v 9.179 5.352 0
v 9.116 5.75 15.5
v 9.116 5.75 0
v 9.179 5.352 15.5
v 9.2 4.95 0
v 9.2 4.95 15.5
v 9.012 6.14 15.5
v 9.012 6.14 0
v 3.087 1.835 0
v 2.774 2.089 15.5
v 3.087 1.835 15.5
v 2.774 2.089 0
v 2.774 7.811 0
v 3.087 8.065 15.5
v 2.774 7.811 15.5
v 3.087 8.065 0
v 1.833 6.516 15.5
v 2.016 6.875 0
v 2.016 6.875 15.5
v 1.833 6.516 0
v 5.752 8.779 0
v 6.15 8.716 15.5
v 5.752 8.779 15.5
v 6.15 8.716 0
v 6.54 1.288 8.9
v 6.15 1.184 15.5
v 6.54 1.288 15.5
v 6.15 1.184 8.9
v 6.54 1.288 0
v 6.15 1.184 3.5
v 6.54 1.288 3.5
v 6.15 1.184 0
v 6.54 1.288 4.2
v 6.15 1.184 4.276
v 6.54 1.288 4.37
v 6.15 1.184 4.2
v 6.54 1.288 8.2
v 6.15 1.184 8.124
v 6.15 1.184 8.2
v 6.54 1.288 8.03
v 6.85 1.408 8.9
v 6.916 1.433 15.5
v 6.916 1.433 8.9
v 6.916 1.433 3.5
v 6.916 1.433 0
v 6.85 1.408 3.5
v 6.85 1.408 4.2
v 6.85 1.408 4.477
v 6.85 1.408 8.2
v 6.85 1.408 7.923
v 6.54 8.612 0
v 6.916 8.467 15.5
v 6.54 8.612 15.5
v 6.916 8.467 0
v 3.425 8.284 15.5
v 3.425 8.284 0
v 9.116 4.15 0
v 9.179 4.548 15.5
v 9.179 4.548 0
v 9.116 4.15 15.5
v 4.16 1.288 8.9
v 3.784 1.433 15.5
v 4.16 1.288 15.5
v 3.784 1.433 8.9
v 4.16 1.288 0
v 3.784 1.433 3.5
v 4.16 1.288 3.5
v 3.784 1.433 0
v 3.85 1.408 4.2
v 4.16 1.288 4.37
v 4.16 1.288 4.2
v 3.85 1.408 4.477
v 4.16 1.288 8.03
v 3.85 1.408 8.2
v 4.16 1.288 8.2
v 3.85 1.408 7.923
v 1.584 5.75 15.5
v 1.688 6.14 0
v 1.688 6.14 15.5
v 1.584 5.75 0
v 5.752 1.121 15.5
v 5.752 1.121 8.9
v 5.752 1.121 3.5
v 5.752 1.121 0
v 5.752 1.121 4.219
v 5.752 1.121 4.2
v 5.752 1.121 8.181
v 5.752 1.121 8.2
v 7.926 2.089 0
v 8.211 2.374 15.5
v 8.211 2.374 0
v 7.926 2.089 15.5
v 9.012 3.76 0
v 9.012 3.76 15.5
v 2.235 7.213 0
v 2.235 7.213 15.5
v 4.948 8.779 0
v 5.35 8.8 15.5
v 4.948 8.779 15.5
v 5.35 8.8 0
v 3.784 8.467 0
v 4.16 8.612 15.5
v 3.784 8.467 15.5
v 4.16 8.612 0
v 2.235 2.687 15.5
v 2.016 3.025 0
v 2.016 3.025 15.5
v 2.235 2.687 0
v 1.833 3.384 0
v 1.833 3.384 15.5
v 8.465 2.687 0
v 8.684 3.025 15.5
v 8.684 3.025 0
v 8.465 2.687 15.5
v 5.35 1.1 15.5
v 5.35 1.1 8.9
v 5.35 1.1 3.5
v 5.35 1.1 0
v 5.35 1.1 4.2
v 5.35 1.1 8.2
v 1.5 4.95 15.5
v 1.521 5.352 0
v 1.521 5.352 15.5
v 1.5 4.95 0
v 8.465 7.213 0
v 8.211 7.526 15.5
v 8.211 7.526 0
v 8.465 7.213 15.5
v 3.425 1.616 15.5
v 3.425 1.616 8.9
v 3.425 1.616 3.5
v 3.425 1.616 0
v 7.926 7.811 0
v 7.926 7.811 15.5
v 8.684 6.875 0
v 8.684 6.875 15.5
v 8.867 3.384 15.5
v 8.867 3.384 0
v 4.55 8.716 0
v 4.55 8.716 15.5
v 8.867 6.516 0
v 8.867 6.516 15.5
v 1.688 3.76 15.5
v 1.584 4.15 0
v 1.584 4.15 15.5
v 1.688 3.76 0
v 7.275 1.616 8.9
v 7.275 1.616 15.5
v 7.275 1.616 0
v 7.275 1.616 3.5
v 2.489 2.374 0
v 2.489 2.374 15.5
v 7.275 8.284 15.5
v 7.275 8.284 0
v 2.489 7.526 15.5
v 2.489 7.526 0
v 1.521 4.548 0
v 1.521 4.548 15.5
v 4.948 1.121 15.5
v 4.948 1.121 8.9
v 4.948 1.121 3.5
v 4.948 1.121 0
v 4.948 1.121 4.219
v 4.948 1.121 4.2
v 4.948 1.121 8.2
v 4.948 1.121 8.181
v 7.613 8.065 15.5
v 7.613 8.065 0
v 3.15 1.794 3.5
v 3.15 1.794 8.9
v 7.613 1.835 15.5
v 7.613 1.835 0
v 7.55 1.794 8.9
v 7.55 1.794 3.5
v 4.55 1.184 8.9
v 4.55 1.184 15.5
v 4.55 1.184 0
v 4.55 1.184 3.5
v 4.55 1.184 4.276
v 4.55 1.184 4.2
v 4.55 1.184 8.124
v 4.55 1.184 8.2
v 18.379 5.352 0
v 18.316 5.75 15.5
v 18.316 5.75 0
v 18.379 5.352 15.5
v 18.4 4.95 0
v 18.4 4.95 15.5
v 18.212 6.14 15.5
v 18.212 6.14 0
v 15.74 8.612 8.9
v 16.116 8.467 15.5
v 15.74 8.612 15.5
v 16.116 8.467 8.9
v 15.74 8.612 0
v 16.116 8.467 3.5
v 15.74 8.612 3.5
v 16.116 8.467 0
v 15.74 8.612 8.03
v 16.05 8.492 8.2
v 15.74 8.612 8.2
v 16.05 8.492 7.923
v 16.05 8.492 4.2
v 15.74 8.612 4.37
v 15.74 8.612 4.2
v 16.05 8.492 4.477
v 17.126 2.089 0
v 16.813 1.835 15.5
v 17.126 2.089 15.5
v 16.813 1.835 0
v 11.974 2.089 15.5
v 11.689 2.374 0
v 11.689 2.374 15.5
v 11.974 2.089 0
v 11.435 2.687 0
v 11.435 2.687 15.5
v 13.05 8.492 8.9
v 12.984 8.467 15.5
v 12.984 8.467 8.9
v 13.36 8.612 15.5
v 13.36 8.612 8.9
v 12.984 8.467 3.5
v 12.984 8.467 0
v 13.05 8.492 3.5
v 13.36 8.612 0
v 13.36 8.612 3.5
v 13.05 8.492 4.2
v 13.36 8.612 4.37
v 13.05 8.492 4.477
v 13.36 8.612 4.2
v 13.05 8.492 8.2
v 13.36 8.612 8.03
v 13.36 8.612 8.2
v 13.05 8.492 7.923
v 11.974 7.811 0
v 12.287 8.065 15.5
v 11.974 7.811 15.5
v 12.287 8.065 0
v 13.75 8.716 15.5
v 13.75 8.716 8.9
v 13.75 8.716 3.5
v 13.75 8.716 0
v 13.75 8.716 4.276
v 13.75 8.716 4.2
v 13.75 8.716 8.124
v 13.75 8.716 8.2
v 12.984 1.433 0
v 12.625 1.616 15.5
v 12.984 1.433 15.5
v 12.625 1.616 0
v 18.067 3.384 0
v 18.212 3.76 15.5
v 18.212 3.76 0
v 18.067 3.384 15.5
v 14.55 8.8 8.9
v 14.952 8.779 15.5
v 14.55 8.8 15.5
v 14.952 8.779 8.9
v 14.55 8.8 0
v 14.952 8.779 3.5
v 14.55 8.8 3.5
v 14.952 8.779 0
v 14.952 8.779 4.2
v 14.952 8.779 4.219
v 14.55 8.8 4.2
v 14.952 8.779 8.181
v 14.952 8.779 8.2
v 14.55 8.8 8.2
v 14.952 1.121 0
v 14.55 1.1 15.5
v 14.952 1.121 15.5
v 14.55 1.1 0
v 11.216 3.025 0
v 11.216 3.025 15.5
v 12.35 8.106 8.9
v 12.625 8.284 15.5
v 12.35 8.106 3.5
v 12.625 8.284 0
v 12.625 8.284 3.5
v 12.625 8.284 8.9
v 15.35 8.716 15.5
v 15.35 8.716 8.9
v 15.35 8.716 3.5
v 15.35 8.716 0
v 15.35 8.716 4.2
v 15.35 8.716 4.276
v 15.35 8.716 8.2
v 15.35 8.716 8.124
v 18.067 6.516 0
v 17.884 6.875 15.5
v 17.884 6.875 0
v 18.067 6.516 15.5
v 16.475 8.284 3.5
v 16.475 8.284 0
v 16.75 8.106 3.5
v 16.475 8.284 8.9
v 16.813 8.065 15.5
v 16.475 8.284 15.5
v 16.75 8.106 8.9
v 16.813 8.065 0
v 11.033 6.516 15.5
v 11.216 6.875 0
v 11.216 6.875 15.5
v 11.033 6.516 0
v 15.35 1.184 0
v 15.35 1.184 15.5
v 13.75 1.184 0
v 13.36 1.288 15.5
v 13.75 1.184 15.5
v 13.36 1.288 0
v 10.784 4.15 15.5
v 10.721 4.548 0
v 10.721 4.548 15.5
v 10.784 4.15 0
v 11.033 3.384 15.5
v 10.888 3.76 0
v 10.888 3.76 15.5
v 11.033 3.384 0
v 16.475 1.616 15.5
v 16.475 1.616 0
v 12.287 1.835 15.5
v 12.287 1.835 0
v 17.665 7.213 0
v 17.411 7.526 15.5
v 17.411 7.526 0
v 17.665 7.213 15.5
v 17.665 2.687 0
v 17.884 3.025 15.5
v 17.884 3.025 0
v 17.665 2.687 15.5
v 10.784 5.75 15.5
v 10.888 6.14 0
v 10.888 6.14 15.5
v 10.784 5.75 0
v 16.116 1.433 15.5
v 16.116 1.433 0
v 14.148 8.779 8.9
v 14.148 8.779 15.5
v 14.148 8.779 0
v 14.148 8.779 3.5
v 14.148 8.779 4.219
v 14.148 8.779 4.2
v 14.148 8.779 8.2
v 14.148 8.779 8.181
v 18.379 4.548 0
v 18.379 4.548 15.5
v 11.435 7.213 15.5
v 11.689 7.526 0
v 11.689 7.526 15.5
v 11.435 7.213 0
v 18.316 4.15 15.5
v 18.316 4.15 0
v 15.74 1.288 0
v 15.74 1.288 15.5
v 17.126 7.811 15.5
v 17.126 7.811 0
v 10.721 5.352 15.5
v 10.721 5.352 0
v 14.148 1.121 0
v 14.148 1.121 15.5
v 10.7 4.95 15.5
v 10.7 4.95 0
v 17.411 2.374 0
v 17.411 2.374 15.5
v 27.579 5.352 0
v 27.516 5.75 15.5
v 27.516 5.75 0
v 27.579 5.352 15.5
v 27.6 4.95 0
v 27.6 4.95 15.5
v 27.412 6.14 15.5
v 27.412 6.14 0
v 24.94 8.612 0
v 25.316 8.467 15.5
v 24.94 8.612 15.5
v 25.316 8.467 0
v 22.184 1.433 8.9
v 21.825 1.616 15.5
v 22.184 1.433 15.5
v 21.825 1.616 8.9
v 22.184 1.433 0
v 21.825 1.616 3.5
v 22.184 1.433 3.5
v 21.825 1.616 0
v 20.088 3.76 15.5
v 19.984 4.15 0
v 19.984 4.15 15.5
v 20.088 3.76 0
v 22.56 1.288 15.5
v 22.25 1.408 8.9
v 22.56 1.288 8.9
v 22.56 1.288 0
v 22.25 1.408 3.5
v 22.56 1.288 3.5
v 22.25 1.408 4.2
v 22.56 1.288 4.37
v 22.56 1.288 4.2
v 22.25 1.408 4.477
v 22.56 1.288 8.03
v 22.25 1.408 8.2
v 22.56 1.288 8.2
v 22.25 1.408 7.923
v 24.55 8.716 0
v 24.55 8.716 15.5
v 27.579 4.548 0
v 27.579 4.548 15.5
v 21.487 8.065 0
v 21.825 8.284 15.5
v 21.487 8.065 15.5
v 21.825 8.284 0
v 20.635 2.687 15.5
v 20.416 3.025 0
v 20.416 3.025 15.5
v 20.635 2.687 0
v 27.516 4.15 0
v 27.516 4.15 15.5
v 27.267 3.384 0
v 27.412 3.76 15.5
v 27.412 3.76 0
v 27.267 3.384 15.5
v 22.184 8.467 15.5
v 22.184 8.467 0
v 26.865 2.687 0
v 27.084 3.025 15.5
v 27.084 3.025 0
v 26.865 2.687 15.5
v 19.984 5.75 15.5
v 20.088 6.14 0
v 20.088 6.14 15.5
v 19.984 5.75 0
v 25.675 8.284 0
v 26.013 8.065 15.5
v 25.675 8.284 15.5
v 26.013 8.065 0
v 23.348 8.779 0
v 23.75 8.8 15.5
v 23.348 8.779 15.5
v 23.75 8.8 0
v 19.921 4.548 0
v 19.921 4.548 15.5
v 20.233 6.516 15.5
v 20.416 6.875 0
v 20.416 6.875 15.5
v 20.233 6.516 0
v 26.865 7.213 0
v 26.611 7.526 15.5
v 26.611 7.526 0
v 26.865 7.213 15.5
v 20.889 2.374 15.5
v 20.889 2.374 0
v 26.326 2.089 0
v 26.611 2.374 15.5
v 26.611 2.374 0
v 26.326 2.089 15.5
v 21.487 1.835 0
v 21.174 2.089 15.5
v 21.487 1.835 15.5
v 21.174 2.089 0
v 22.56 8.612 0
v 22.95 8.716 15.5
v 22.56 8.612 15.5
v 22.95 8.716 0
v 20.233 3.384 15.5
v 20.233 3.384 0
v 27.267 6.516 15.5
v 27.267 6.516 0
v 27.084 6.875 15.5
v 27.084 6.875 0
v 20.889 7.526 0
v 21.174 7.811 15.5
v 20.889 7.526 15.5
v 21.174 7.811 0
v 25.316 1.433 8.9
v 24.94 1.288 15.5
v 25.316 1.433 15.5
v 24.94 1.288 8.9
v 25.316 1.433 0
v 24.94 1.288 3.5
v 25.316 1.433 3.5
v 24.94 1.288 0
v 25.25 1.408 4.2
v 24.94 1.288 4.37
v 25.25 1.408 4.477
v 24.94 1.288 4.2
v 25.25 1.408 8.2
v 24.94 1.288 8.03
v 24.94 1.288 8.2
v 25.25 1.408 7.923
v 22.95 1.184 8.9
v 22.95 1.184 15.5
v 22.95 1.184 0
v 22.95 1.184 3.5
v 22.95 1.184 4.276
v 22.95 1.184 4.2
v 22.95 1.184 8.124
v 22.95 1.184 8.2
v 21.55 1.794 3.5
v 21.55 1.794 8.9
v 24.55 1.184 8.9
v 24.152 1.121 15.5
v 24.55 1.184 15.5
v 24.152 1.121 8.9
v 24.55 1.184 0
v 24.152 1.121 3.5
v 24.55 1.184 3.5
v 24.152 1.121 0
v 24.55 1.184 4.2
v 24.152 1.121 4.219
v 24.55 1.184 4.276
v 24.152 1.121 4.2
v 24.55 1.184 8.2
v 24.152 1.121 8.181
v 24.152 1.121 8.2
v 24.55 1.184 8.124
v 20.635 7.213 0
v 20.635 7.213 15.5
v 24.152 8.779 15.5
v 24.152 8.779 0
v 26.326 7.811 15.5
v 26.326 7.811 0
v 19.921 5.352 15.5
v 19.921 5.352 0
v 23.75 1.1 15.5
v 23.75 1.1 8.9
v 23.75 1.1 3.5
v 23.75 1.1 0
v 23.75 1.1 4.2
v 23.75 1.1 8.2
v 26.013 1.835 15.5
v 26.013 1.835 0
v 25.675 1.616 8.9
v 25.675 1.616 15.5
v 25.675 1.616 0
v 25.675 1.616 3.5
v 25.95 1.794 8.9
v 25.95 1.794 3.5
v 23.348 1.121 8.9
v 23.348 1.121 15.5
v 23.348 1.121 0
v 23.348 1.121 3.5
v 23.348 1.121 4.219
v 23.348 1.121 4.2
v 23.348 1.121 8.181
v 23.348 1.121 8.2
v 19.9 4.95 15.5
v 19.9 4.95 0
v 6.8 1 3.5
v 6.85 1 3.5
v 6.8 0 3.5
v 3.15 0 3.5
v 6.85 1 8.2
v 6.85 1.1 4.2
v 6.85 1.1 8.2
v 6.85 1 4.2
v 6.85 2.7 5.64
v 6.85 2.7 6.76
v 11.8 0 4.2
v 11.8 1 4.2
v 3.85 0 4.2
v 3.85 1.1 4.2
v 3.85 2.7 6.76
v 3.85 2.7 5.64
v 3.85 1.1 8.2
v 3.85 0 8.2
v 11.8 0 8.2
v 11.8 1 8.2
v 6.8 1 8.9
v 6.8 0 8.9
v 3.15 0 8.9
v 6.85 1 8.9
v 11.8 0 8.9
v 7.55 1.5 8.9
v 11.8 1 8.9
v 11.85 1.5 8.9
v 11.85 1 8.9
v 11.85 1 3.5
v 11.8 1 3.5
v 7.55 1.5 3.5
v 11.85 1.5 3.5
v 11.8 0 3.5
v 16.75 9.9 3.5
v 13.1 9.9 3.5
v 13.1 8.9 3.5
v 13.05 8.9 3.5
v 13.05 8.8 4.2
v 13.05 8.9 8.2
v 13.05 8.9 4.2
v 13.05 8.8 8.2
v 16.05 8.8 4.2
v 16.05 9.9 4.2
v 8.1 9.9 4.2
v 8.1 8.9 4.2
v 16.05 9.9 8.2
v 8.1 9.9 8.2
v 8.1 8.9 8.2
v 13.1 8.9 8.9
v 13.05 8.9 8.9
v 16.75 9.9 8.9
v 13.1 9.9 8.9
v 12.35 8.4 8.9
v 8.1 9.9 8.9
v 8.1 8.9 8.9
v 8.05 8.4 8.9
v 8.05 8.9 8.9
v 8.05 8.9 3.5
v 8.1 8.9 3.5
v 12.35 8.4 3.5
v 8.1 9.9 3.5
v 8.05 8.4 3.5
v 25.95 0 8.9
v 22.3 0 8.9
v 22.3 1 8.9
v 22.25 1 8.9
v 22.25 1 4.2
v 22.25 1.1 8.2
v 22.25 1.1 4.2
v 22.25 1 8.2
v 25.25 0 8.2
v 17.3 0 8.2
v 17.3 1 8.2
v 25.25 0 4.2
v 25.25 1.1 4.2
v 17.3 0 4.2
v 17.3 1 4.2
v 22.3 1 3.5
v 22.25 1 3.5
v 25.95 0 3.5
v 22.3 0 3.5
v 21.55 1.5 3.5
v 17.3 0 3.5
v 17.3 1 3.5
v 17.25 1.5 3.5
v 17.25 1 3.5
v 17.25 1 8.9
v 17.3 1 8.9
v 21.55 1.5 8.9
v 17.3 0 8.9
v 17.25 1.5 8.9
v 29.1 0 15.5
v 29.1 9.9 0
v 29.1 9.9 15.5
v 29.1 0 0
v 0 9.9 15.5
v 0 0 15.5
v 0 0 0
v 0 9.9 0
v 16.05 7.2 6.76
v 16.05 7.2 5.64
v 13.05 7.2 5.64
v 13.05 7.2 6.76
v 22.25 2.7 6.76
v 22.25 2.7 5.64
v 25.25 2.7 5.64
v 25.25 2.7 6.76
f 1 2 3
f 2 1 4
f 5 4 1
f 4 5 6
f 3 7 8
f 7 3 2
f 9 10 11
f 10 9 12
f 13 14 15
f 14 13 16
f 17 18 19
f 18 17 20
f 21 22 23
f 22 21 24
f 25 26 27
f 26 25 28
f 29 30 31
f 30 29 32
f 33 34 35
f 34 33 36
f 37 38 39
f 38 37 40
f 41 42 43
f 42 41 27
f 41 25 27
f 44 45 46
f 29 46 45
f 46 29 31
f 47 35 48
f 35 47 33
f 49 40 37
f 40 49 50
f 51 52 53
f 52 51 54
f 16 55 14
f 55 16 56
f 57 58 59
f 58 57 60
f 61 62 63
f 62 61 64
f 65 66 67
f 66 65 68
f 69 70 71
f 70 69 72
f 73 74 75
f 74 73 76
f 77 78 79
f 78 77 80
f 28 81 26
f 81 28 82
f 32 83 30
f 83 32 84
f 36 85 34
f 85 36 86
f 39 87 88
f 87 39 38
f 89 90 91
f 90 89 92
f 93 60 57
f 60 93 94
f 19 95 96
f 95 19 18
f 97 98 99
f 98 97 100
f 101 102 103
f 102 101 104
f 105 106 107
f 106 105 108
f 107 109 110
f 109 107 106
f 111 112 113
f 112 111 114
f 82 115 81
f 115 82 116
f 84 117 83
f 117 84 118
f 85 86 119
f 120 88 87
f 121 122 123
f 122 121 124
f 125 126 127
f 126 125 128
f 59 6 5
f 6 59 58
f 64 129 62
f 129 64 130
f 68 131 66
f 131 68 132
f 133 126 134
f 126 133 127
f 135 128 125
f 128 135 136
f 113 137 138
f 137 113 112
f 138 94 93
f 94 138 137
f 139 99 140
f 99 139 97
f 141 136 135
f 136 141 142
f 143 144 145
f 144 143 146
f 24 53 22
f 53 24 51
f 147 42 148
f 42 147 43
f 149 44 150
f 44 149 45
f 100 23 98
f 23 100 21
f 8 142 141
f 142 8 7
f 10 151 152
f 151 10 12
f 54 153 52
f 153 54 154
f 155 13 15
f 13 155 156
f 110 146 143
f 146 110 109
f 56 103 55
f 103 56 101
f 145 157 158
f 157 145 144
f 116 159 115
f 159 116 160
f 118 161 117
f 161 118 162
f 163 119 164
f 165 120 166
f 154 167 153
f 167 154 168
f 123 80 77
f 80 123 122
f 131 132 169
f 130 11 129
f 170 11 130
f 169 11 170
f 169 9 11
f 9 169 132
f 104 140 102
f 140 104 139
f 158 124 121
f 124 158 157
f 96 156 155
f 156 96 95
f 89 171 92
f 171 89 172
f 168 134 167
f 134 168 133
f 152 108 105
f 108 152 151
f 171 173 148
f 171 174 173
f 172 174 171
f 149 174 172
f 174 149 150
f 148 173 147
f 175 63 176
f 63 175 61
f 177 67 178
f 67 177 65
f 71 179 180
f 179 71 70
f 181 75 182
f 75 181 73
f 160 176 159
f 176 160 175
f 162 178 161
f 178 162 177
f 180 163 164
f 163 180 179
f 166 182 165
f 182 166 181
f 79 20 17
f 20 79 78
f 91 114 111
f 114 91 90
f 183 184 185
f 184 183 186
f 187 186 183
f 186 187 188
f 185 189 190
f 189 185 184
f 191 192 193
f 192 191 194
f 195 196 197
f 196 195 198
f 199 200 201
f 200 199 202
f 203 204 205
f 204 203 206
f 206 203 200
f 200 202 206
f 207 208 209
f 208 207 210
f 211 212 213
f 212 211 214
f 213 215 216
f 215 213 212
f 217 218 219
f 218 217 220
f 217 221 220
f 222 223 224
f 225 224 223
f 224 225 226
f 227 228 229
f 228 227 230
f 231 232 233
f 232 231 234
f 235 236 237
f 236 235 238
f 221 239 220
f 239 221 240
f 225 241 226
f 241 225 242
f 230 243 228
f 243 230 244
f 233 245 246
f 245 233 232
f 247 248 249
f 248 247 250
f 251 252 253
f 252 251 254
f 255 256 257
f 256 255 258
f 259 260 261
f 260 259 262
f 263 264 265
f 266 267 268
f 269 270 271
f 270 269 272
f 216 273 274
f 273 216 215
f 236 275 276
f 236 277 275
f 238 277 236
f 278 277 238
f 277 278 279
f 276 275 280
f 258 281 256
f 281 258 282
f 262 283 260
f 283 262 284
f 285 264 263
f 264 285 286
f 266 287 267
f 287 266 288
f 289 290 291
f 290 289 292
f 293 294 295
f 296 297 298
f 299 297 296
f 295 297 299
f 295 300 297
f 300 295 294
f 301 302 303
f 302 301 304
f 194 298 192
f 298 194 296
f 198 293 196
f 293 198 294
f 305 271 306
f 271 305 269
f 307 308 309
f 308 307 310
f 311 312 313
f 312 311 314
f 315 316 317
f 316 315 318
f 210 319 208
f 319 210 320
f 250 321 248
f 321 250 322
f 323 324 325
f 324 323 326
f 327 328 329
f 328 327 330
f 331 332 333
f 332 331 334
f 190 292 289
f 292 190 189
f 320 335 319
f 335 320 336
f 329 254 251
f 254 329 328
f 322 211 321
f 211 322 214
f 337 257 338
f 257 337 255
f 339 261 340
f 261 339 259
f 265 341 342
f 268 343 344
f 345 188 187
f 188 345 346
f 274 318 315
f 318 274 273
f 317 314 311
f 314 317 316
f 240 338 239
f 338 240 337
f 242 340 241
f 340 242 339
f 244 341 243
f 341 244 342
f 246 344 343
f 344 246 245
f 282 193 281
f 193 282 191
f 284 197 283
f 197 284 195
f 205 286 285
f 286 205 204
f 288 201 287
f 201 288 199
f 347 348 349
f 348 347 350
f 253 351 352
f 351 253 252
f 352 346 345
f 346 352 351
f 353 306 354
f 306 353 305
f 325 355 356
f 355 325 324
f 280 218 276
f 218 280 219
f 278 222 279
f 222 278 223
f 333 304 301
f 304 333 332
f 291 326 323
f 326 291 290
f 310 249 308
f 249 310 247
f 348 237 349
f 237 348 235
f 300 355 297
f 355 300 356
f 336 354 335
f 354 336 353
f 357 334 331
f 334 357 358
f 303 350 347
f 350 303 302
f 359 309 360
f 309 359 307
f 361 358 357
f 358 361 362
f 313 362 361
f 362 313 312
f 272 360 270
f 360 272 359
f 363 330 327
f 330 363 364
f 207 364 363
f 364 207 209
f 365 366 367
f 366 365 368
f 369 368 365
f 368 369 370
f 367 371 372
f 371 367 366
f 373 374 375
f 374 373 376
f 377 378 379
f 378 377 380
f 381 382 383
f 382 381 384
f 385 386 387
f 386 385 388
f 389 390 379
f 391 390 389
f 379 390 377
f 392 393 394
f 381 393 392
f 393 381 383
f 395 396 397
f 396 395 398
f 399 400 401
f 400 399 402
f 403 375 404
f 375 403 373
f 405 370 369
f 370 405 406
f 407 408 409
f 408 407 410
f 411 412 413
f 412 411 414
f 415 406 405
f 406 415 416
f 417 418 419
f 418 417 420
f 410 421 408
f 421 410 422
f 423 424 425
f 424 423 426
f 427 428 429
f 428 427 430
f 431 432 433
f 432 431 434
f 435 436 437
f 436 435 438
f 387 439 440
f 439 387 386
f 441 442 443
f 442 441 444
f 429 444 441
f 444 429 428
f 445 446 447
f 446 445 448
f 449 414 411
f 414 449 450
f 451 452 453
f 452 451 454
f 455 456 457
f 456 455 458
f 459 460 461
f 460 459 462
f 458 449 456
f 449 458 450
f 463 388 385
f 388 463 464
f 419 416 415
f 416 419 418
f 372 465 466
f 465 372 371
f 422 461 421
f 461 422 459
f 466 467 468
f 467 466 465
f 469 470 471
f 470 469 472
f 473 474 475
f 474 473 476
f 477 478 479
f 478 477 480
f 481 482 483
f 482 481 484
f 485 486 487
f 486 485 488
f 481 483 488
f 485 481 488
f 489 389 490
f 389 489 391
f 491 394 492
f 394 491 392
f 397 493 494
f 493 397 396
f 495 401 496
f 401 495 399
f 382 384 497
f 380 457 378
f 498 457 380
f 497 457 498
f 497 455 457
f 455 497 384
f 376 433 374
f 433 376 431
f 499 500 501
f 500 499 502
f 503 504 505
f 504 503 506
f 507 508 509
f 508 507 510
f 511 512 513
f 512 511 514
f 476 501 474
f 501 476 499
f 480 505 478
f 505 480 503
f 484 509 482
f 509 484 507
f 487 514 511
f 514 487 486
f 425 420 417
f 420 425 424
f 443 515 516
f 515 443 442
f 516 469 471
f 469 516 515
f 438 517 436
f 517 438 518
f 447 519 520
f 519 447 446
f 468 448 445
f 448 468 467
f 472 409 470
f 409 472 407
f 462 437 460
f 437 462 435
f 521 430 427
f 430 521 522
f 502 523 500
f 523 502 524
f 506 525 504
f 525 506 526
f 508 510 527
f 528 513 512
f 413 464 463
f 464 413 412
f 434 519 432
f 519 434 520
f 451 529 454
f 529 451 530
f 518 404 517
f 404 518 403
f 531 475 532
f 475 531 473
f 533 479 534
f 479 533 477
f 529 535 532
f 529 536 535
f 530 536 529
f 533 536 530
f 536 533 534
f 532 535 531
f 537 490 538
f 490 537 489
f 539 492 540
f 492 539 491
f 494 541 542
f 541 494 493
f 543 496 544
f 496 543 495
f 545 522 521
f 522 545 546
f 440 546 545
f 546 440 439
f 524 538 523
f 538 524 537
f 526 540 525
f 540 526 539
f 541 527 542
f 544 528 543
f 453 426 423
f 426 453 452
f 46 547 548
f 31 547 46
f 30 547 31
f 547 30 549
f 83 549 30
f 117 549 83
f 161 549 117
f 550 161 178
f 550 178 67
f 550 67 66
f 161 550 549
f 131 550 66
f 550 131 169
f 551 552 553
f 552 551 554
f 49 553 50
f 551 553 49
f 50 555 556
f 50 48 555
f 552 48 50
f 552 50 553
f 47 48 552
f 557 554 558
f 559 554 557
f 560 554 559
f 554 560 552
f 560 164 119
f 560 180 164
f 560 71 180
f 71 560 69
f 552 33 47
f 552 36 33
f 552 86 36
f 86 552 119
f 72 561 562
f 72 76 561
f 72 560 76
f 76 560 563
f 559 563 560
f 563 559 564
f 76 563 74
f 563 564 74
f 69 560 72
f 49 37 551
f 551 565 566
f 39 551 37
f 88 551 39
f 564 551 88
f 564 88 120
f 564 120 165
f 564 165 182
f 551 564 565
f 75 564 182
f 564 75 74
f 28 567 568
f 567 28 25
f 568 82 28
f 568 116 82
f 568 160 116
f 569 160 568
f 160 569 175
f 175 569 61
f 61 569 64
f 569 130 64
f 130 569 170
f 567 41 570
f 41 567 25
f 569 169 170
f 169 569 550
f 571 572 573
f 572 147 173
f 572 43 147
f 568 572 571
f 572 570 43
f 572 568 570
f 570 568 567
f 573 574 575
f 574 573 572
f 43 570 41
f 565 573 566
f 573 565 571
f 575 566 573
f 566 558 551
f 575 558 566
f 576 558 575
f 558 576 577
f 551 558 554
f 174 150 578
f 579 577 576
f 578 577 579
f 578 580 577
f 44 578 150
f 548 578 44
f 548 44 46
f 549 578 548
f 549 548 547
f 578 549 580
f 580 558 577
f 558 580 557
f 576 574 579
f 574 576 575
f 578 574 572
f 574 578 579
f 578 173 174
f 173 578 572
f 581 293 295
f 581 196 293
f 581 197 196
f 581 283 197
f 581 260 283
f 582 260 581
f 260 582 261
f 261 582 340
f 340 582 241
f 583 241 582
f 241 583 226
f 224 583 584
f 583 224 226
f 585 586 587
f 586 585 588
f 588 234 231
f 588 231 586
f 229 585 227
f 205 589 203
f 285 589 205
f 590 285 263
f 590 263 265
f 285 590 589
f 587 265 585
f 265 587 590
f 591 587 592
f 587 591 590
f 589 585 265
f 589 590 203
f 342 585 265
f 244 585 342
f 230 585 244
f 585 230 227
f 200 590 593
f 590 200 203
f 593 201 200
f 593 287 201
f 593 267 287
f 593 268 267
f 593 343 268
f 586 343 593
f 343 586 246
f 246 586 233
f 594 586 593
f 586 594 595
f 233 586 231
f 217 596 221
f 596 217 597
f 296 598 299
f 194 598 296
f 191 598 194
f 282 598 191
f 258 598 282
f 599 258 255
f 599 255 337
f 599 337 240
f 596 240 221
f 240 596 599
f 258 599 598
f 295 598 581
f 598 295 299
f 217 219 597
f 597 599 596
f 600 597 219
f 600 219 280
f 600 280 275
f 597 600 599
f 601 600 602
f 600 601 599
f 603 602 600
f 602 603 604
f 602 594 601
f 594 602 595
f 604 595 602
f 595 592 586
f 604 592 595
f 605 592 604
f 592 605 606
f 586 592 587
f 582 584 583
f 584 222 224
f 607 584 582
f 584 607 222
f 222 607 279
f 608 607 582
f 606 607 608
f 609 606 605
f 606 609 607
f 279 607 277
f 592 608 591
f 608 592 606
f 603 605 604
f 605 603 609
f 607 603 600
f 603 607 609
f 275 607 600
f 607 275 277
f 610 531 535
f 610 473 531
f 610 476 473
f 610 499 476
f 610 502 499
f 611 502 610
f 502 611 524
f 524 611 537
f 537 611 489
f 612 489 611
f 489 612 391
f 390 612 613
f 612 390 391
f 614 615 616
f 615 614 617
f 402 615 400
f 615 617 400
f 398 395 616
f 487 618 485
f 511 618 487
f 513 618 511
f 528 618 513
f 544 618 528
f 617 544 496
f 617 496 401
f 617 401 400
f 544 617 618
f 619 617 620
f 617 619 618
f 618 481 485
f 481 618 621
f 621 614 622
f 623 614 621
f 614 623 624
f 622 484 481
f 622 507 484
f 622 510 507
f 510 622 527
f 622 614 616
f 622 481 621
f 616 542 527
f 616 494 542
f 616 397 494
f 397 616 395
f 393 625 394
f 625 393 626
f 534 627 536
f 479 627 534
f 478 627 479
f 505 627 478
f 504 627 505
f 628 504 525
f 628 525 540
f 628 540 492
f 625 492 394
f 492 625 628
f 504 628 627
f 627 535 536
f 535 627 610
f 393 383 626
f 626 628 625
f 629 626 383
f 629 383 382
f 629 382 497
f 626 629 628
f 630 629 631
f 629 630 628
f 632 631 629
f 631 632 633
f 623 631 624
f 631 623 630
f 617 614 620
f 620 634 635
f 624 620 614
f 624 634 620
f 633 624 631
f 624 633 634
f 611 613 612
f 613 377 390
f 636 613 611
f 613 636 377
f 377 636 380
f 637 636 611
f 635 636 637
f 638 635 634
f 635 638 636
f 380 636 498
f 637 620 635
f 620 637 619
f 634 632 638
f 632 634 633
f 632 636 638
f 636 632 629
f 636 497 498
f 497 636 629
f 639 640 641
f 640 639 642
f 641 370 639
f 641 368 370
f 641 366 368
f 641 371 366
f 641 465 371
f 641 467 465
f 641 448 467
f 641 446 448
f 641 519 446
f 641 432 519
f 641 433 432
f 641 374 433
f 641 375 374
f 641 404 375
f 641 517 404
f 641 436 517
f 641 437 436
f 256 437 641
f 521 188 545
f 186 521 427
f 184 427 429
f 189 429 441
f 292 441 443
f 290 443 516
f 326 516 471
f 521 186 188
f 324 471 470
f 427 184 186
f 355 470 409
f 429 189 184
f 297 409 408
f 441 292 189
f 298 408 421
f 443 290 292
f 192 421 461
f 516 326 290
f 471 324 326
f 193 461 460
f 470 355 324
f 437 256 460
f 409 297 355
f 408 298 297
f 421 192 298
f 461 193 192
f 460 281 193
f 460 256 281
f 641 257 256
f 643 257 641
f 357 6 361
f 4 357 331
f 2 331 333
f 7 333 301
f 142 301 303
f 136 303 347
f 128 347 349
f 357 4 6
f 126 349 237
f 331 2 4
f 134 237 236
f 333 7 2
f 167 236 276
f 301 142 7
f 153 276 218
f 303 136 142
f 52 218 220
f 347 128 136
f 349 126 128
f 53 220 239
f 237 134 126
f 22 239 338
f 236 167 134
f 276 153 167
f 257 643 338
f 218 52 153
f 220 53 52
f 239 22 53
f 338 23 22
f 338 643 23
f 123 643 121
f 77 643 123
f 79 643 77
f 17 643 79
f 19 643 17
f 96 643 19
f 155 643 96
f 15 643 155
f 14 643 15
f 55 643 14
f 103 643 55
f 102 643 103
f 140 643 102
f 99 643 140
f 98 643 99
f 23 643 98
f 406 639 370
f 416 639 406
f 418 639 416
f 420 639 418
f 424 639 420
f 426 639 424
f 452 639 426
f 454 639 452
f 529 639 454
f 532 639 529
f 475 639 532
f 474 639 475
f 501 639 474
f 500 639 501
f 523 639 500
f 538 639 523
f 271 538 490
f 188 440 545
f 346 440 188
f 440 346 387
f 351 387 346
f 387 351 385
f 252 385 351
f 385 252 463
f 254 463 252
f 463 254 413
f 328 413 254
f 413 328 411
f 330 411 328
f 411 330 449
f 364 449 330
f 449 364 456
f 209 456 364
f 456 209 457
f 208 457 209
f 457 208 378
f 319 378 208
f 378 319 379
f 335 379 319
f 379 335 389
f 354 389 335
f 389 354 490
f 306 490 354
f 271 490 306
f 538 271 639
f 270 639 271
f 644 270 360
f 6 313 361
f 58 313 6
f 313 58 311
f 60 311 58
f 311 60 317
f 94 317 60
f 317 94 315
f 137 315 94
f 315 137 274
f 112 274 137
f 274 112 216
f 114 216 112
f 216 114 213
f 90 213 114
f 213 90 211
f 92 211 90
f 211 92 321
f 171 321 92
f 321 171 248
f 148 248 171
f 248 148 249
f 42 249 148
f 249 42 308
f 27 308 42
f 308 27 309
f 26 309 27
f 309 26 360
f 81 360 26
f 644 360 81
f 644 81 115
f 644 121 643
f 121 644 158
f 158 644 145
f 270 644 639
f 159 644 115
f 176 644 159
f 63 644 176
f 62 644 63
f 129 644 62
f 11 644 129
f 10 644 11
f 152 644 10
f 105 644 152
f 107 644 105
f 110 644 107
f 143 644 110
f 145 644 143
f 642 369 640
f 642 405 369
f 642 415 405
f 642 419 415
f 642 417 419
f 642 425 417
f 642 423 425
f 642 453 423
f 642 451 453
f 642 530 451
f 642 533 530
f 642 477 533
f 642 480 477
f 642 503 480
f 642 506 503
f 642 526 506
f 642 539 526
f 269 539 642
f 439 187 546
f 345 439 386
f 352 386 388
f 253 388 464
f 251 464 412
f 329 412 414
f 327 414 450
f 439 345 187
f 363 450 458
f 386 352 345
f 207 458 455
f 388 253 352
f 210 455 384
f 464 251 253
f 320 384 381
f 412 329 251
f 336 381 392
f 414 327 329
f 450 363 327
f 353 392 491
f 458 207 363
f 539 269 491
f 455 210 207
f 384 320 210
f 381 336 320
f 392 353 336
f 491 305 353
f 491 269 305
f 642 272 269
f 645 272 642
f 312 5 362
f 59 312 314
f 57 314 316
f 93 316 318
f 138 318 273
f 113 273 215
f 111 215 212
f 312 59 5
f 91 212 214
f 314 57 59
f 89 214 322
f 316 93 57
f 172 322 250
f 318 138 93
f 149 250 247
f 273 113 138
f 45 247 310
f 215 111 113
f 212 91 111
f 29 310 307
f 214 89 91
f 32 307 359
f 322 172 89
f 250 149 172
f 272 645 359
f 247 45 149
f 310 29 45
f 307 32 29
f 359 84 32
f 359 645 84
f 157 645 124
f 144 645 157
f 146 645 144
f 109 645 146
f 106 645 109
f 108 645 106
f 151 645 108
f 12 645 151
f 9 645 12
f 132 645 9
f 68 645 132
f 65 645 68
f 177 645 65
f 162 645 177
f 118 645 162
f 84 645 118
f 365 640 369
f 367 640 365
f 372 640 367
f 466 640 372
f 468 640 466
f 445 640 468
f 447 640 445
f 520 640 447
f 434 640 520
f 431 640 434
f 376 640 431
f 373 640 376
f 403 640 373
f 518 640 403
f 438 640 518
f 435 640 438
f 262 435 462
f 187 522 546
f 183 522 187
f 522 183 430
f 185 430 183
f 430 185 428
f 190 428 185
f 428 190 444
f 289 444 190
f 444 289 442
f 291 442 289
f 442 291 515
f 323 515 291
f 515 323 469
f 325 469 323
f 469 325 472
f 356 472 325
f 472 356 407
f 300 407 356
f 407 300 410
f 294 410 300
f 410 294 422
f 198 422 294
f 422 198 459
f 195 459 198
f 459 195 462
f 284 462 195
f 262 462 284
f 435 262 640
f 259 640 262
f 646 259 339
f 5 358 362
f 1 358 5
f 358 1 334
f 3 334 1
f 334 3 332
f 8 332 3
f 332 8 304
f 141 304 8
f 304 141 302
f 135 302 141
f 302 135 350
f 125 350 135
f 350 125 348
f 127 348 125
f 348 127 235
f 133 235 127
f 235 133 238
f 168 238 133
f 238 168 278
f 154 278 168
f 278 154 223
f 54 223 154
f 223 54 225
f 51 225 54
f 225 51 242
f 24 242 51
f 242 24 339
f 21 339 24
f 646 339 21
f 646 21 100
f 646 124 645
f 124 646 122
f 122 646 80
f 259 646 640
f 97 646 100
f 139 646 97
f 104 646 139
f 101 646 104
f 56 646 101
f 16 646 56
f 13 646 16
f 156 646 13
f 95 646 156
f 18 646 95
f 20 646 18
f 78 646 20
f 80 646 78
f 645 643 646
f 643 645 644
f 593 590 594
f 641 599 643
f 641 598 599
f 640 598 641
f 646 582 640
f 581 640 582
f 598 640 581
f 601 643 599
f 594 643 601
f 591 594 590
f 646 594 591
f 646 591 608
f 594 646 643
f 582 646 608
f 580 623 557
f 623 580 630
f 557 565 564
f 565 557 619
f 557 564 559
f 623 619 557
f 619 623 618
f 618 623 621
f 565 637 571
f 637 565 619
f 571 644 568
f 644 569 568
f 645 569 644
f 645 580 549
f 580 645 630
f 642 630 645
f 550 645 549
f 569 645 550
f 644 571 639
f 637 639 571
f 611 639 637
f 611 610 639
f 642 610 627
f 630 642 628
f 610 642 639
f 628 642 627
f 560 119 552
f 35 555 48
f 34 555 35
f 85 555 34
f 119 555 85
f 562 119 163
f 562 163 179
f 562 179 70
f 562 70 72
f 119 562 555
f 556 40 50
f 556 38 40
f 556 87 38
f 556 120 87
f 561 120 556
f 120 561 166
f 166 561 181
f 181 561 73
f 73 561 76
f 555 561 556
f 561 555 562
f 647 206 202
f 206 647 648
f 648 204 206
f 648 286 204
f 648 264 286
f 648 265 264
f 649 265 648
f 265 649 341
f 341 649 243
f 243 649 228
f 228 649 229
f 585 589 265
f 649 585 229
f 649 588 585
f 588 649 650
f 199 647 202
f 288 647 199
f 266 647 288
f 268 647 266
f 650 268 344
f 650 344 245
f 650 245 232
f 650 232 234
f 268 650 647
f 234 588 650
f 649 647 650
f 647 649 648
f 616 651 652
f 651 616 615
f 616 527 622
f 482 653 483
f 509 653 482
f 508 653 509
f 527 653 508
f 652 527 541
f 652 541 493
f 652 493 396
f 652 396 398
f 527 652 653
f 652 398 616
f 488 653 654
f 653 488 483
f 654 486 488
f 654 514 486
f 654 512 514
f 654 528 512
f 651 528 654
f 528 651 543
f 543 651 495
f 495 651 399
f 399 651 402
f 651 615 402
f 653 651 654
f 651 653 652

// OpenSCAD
// Hex bit holder v1
// KBS3056 02.07.2019

slot_num                = 3;
bit_separate_space      = 1.5; 
holder_height           = 15.5;
side_wall_thickness     = 1.1;

//advanced
hole_diam               = 7.7; //for bit 6.33/7.14mm diameter. 4.9mm indentation diameter 
latch_thickness         = 1.6; 
latch_height            = 4;  
latch_width             = 3;
latch_pos_z             = 4.2; 
$fn                     = 60;
spring_thickness        = 1;

//no need to change
spring_length           = 5; 


union(){
    difference(){
        cube([slot_num * (hole_diam + bit_separate_space) + bit_separate_space, 2 * side_wall_thickness + hole_diam, holder_height]);
        translate([hole_diam / 2 + bit_separate_space, 0, 0])
            for(n = [0 : slot_num - 1])
                translate([n * (hole_diam + bit_separate_space), hole_diam / 2 + side_wall_thickness, -0.05])
                    cylinder(h = holder_height + 0.1, d = hole_diam);
//difference
        translate([hole_diam / 2 + bit_separate_space - latch_width / 2, 0, 0])           
        for(n = [0 : slot_num - 1])  
            
            if(n % 2 == 0)
                if(n == 0)
                    translate([n * (hole_diam + bit_separate_space) + latch_width, side_wall_thickness + hole_diam / 2 - 0.2, latch_pos_z + latch_height])
                        rotate([0, 180, 0])
                            cutter(latch_height, latch_width);
                else
                    translate([n * (hole_diam + bit_separate_space), side_wall_thickness + hole_diam / 2 - 0.2, latch_pos_z])
                        cutter(latch_height, latch_width);
            
            else
                translate([n * (hole_diam + bit_separate_space), side_wall_thickness + hole_diam / 2 + 0.2, latch_pos_z + latch_height])
                    rotate([0, 180, 180])
                        cutter(latch_height, latch_width);
    }   
    
//union
    translate([hole_diam / 2 + bit_separate_space - latch_width / 2, 0, 0])           
        for(n = [0 : slot_num - 1])  
            
            if(n % 2 == 0)
                translate([n * (hole_diam + bit_separate_space), side_wall_thickness, latch_pos_z])
                    latch(latch_height, latch_thickness);
            
            else
                translate([n * (hole_diam + bit_separate_space) + latch_width, side_wall_thickness + hole_diam, latch_pos_z])
                    rotate([0, 0, 180])
                        latch(latch_height, latch_thickness);
}   

module cutter(latch_height, latch_width) {
    union(){
        rotate([90, 0, 0])
            linear_extrude(side_wall_thickness + hole_diam / 2 )
                polygon([[0, 0], [latch_width, 0], [latch_width, latch_height], [0, latch_height], [0, latch_height + 0.7], [latch_width + 0.7, latch_height + 0.7], [latch_width + 0.7, -0.7], [0, -0.7]]);
        translate([ -spring_length + 0.05, - (side_wall_thickness + hole_diam / 2), -0.7])
            cube([spring_length, spring_thickness + 0.2, 0.7]);
        translate([ -spring_length + 0.05, - (side_wall_thickness + hole_diam / 2), latch_height])
            cube([spring_length, spring_thickness + 0.2, 0.7]);
        translate([ -spring_length, -(0.3 + hole_diam / 2 + side_wall_thickness - spring_thickness - 0.5), -0.7])
            cube([spring_length, 0.5, latch_height + 2 * 0.7]);
        translate([-0.7, -hole_diam / 2 - side_wall_thickness + spring_thickness + 0.2, -0.7])
            cube([0.7, side_wall_thickness + hole_diam / 2 , latch_height + 2 * 0.7]);
    }
}

module latch(latch_height, latch_thickness) {
    rotate([90, 0, 90])
        linear_extrude(latch_width)
            polygon([[0, 0], [0, latch_height], [latch_thickness, latch_height - latch_thickness * 0.9], [latch_thickness, latch_thickness * 0.9]]);
}

assert(!(latch_height / latch_thickness < 1.875)); //too large 'latch_thickness' or too small 'latch_height'
assert(!(side_wall_thickness < 1.0)); //too small 'side_wall_thickness'
assert(!(slot_num < 1.3)); //'slot_num' must be larger than "1"
assert(!(spring_thickness > side_wall_thickness)); //too large 'spring_thickness' or too small 'side_wall_thickness'
assert(!(spring_length / (hole_diam + bit_separate_space) > 0.58)); //too large 'spring_thickness' or too small 'side_wall_thickness'
assert(!( latch_height > holder_height - latch_pos_z - 1.5)); //too large 'latch_height' or too small 'holder_height'
assert(!( latch_width > hole_diam / 2)); //too large 'latch_width'
assert(!( 0> 1.3)); //'slot_num' must be larger than "1"
